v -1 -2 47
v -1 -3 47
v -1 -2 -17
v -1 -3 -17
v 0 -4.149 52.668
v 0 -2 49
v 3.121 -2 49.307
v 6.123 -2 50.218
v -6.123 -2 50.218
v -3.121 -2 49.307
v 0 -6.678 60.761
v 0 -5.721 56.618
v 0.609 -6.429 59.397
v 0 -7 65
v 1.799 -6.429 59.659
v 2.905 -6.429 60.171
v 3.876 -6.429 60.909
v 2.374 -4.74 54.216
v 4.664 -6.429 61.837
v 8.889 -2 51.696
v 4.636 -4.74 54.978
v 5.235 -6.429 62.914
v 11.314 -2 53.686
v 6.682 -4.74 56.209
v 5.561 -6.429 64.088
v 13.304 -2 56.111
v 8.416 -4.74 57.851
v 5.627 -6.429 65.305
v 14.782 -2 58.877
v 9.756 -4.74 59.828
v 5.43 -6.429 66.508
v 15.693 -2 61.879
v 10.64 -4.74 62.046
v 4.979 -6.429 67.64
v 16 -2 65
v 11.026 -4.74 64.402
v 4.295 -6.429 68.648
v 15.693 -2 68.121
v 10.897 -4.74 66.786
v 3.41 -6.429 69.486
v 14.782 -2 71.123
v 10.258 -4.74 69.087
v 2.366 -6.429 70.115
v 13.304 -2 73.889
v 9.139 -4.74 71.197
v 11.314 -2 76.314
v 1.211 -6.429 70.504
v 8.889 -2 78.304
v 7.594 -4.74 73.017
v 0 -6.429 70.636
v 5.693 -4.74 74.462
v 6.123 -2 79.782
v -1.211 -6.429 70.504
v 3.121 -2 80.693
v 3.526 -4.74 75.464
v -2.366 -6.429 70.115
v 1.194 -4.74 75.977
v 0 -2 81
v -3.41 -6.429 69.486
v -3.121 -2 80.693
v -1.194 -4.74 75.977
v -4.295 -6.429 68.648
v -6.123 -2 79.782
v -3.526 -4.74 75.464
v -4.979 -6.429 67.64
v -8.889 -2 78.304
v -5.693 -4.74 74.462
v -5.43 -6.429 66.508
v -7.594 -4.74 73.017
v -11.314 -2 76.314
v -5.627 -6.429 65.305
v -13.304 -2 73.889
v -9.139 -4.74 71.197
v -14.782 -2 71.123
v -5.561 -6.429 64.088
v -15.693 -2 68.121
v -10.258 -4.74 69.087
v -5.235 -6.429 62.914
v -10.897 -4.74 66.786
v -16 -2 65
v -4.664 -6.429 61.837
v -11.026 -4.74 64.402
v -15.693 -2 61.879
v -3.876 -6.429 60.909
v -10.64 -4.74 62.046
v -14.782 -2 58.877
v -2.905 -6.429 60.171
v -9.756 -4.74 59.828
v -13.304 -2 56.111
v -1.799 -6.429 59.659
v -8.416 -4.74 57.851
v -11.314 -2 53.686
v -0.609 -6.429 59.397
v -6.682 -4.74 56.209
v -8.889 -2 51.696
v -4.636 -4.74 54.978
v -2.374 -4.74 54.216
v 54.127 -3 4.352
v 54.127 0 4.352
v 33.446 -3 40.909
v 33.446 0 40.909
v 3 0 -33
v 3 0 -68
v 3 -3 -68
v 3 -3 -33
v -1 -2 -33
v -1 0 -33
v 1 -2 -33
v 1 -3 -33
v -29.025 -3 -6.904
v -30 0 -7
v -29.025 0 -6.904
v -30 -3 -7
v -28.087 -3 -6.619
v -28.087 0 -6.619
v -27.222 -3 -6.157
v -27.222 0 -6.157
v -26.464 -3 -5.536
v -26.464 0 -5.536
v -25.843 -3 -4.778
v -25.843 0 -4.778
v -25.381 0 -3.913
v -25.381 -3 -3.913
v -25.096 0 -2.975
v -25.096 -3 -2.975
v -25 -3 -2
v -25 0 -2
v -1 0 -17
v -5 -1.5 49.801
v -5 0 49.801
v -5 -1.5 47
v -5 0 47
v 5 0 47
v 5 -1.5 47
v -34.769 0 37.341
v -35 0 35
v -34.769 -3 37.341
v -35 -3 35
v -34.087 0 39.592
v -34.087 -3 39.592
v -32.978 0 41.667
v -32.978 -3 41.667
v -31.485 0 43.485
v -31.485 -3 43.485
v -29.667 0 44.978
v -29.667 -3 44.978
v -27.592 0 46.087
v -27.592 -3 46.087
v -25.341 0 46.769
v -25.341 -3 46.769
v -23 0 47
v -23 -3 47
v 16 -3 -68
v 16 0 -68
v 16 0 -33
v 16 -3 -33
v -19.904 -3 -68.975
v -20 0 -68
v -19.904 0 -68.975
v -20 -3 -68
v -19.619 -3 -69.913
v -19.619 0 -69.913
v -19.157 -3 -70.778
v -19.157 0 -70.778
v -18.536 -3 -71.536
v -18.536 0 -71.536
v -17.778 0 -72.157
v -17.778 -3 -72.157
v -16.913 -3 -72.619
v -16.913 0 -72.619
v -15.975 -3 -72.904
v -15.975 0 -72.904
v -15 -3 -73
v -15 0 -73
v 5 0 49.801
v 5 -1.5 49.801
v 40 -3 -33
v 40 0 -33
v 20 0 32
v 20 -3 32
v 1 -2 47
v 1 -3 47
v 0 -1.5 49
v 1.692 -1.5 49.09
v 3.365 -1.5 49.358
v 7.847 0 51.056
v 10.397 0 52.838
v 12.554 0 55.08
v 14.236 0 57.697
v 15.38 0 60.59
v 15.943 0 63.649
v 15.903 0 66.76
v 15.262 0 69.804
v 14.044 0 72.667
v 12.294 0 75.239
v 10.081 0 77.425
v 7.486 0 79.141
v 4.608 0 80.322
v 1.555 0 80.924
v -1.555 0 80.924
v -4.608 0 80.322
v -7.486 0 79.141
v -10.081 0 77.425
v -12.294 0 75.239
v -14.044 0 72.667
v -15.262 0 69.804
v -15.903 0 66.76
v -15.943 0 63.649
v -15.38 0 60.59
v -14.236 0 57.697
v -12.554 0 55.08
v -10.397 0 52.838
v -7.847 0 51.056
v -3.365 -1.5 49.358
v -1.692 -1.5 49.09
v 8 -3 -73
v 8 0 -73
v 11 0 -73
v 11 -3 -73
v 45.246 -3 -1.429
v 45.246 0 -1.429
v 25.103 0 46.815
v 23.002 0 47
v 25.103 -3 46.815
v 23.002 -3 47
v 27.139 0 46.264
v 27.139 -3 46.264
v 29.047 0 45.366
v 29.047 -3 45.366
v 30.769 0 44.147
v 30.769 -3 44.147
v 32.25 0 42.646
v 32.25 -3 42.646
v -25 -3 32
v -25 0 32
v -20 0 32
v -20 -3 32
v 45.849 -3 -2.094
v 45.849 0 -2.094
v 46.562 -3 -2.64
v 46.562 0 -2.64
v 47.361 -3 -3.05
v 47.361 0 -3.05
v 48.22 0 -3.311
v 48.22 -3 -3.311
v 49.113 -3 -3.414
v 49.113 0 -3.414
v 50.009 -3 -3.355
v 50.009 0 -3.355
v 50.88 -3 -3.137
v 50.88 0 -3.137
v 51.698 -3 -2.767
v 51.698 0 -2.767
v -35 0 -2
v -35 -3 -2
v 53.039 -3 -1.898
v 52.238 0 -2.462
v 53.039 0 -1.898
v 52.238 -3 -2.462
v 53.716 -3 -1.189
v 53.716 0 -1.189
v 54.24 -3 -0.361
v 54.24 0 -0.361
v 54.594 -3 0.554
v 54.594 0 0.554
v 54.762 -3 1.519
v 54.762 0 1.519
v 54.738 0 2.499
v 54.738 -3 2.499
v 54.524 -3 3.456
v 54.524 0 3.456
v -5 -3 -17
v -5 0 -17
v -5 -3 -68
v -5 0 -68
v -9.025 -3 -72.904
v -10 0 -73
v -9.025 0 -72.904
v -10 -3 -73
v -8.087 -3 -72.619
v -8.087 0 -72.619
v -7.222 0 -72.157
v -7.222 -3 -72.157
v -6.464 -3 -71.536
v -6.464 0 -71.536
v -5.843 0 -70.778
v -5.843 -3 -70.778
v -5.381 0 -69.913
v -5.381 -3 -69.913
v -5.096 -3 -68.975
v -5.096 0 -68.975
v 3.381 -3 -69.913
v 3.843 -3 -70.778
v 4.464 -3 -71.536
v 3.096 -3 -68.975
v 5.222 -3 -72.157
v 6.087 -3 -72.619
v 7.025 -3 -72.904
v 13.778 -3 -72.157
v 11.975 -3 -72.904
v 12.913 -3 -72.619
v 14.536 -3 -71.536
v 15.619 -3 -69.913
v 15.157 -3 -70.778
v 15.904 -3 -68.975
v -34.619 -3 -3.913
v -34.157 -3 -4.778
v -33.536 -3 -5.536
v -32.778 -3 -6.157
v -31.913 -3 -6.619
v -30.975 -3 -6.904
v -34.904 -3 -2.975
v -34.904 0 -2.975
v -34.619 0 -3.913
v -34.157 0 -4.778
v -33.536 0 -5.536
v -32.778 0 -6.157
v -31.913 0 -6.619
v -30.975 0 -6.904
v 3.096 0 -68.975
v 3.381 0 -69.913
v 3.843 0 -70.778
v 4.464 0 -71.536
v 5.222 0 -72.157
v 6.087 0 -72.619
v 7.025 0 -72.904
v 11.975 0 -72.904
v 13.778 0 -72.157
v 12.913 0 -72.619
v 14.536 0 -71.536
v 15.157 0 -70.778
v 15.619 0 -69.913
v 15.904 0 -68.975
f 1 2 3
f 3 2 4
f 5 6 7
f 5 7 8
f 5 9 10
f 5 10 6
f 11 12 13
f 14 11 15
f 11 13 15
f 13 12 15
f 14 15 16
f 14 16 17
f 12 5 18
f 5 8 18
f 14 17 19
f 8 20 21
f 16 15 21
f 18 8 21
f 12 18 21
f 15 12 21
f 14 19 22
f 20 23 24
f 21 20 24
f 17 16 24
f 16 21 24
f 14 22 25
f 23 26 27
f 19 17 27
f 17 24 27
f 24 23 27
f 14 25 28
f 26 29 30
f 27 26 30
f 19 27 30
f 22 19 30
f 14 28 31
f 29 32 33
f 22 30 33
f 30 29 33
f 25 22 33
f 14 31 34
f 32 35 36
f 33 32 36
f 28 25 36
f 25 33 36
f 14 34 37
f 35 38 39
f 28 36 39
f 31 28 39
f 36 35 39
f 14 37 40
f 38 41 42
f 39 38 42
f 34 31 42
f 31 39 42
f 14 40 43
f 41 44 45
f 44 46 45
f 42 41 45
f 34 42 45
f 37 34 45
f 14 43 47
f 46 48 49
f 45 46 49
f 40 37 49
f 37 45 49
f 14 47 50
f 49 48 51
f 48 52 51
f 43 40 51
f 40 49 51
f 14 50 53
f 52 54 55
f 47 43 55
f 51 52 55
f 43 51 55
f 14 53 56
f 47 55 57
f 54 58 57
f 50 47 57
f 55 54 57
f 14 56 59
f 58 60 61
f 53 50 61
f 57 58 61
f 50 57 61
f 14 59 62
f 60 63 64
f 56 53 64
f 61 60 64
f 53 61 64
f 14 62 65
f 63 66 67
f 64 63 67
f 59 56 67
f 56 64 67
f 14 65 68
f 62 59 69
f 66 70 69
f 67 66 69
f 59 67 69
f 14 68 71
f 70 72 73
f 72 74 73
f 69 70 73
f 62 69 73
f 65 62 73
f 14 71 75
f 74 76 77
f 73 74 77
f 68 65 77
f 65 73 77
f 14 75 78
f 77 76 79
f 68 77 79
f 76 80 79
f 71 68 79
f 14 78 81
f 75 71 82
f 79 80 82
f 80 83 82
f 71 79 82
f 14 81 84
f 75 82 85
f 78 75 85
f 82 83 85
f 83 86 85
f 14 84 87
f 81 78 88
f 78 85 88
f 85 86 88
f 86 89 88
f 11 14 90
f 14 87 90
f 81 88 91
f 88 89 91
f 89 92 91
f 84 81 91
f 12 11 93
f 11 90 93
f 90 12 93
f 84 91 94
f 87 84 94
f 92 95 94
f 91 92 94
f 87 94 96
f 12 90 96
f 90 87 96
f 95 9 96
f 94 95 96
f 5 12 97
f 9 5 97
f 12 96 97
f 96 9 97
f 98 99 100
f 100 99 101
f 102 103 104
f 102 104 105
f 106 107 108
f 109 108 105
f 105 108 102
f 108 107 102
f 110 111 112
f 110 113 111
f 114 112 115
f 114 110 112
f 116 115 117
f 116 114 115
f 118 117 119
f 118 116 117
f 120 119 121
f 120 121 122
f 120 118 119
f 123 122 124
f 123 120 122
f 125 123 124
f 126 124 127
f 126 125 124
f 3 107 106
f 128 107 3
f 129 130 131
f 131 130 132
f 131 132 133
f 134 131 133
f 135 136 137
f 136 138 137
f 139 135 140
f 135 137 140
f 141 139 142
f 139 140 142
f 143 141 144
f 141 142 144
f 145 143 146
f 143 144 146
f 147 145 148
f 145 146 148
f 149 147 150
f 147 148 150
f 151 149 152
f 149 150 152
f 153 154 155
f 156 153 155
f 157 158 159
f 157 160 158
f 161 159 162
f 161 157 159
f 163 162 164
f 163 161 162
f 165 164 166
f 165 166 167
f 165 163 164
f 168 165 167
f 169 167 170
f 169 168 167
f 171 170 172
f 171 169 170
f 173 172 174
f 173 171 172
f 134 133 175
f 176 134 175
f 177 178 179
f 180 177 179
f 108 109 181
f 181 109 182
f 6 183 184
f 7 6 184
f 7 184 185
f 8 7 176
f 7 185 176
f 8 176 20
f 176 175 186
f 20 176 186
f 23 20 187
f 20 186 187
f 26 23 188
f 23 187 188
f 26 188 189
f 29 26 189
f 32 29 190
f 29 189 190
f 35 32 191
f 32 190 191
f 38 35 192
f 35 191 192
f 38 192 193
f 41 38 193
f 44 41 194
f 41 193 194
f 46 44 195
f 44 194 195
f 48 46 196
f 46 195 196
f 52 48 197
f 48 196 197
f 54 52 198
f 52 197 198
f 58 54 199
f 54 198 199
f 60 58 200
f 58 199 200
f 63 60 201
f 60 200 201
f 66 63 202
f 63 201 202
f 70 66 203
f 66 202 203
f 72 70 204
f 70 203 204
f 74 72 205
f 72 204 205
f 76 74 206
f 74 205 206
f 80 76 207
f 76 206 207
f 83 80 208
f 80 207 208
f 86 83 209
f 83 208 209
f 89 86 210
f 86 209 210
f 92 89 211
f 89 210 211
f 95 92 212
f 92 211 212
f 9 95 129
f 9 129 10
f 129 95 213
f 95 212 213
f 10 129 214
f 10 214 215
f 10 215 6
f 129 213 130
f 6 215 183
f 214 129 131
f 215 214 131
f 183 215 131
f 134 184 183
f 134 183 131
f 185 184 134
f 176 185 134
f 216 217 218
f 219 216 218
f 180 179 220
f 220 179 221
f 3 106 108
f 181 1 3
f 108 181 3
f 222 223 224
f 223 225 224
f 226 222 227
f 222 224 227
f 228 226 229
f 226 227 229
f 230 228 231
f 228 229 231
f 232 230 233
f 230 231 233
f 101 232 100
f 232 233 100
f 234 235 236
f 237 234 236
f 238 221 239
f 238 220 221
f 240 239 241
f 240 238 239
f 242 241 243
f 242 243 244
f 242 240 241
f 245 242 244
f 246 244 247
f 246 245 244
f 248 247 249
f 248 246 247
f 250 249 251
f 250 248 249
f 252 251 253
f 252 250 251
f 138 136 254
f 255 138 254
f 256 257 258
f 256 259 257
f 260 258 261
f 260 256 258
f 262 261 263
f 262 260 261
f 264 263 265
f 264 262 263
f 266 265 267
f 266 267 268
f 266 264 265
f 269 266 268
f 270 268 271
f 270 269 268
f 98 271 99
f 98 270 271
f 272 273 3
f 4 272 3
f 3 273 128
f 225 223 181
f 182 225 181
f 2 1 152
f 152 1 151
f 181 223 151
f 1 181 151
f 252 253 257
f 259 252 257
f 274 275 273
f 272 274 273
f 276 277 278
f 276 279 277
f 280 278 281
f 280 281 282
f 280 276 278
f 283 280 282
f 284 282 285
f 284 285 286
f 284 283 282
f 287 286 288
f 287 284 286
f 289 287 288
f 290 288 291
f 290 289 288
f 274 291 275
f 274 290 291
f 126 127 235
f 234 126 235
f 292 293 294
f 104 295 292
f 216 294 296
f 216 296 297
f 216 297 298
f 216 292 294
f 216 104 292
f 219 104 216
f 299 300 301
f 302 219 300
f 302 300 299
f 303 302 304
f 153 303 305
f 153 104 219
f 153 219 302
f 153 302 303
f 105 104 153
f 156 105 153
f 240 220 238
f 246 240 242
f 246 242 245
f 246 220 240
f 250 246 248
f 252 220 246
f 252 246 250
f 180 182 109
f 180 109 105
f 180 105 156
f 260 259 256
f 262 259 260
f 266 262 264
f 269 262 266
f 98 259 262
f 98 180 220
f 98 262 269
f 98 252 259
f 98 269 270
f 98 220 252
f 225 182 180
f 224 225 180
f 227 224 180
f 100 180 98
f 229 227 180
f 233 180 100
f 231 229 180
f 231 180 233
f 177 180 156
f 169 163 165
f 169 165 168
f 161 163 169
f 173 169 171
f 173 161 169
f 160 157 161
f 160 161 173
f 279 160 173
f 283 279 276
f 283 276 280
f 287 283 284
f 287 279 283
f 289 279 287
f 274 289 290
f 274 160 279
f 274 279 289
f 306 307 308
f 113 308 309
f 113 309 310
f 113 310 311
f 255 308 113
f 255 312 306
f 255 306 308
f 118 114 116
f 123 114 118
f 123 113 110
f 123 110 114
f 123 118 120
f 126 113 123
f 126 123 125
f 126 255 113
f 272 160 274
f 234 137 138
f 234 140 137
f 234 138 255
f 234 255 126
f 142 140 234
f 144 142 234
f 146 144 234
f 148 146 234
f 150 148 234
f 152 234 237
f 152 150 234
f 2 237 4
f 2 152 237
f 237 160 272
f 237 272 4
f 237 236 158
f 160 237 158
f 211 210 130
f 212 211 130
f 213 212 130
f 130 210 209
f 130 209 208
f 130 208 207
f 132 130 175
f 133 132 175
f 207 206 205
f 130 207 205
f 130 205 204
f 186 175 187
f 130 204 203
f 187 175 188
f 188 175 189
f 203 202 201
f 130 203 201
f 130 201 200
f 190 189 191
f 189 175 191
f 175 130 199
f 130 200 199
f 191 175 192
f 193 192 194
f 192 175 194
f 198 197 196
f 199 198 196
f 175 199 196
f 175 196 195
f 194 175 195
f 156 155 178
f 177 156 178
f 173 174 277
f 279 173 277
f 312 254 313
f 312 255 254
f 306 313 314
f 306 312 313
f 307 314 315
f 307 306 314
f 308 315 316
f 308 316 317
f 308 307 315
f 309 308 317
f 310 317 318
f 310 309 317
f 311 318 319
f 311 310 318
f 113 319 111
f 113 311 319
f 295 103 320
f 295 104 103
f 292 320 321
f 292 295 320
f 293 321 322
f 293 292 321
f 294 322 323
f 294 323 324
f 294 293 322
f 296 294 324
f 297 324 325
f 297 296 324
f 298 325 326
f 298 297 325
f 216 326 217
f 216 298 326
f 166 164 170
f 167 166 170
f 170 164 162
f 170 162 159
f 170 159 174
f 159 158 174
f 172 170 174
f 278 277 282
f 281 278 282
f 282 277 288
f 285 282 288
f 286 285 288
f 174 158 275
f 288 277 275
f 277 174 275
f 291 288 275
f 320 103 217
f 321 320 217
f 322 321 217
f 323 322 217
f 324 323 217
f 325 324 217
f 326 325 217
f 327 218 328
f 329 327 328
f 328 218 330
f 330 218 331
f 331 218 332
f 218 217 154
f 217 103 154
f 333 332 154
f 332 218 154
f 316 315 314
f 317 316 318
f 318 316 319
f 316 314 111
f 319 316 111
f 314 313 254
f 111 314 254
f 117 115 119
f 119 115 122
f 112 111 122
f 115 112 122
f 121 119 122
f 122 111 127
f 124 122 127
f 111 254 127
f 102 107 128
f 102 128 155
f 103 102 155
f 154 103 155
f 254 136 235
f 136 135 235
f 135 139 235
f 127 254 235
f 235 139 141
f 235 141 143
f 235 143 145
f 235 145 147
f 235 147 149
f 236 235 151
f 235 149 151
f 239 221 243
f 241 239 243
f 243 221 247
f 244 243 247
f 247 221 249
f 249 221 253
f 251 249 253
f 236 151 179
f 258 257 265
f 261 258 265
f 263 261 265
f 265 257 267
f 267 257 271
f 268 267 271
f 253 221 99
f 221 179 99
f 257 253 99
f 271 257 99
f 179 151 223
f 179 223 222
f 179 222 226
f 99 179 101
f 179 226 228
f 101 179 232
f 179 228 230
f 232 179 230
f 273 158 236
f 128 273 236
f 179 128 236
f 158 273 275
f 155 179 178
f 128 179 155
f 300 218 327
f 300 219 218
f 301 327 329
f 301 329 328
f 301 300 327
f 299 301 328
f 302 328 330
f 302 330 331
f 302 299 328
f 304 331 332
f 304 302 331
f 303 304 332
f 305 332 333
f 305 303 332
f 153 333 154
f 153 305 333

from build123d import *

# Parameters (mm, degrees)
F0_W     = 10
F0_H     = 6
F0_W_2   = 13
F0_H_2   = 16
F0_W_3   = 4
F0_H_3   = 40
F1_DEPTH = 3
F2_R     = 4.99999
F3_DEPTH = 1.5
F4_R     = 12
F8_DEPTH = 1


# Not quite as in the source:
# - a fillet or chamfer is up to 0.001 mm smaller than in the source, because OpenCascade refuses the exact size


with BuildPart() as f1:
    # F0 (on Front) → F1 (new body)
    with BuildSketch(Plane.XZ):
        with Locations((0, 44)):
            Rectangle(F0_W, F0_H)
        Polygon((-5, 41), (-5, 47), (-20, 47), (-20, 32), (-20, -7), (-20, -73), (-5, -73), (-5, -17), (-1, -17), (3, -17), (16, -17), (16, -33), (20, -33), (20, 32), (20, 47), (5, 47), (5, 41), align=None)
        Polygon((-20, 32), (-20, 47), (-35, 47), (-35, -7), (-25, -7), (-25, 32), align=None)
        Polygon((40, -33), (20, 32), (20, -33), align=None)
        Polygon((30, 47), (20, 47), (20, 32), (47.8857678969, -4.9239762223), (56.5894716006, 0), align=None)
        with Locations((9.5, -25)):
            Rectangle(F0_W_2, F0_H_2)
        with Locations((1, -25)):
            Rectangle(F0_W_3, F0_H_2)
        with Locations((9.5, -53)):
            Rectangle(F0_W_2, F0_H_3)
    extrude(amount=F1_DEPTH)

    # F2 (radius 5 in the source; OpenCascade refuses exactly that, so slightly less here)
    f2_edges = [f1.edges().sort_by_distance(p)[0] for p in [
        (56.589472, -1.5, 0),
        (47.885768, -1.5, -4.923976),
        (-25, -1.5, -7),
        (-35, -1.5, -7),
        (16, -1.5, -73),
        (3, -1.5, -73),
        (-20, -1.5, -73),
        (-5, -1.5, -73),
    ]]
    fillet(f2_edges, radius=F2_R)

    # F4
    f4_edges = [f1.edges().sort_by_distance(p)[0] for p in [
        (30, -1.5, 47),
        (-35, -1.5, 47),
    ]]
    fillet(f4_edges, radius=F4_R)

    # F7 (on face) → F8 (cut)
    with BuildSketch(Plane.XZ.offset(3)):
        Polygon((-1, -17), (-1, -33), (1, -33), (1, 47), (-1, 47), align=None)
    extrude(amount=-F8_DEPTH, mode=Mode.SUBTRACT)


with BuildPart() as f3:
    # F0 (on Front) → F3 (new body)
    with BuildSketch(Plane.XZ):
        with BuildLine():
            ThreePointArc((5, 50.8578643763), (0, 50), (-5, 50.8578643763))
            Line((-5, 50.8578643763), (-5, 47))
            Line((-5, 47), (5, 47))
            Line((5, 47), (5, 50.8578643763))
        make_face()
    extrude(amount=F3_DEPTH)

    # F5 (on Right) → F6 (revolve)
    with BuildSketch(Plane.YZ):
        with BuildLine():
            Line((0, 49), (0, 65))
            Line((0, 65), (-7, 65))
            ThreePointArc((-7, 65), (-5.7208873828, 56.6184726929), (-2, 49))
            Line((-2, 49), (0, 49))
        make_face()
    revolve(axis=Axis((0, -3.5, 65), (0, -1, 0)))


solid = Compound([f1.part, f3.part])
